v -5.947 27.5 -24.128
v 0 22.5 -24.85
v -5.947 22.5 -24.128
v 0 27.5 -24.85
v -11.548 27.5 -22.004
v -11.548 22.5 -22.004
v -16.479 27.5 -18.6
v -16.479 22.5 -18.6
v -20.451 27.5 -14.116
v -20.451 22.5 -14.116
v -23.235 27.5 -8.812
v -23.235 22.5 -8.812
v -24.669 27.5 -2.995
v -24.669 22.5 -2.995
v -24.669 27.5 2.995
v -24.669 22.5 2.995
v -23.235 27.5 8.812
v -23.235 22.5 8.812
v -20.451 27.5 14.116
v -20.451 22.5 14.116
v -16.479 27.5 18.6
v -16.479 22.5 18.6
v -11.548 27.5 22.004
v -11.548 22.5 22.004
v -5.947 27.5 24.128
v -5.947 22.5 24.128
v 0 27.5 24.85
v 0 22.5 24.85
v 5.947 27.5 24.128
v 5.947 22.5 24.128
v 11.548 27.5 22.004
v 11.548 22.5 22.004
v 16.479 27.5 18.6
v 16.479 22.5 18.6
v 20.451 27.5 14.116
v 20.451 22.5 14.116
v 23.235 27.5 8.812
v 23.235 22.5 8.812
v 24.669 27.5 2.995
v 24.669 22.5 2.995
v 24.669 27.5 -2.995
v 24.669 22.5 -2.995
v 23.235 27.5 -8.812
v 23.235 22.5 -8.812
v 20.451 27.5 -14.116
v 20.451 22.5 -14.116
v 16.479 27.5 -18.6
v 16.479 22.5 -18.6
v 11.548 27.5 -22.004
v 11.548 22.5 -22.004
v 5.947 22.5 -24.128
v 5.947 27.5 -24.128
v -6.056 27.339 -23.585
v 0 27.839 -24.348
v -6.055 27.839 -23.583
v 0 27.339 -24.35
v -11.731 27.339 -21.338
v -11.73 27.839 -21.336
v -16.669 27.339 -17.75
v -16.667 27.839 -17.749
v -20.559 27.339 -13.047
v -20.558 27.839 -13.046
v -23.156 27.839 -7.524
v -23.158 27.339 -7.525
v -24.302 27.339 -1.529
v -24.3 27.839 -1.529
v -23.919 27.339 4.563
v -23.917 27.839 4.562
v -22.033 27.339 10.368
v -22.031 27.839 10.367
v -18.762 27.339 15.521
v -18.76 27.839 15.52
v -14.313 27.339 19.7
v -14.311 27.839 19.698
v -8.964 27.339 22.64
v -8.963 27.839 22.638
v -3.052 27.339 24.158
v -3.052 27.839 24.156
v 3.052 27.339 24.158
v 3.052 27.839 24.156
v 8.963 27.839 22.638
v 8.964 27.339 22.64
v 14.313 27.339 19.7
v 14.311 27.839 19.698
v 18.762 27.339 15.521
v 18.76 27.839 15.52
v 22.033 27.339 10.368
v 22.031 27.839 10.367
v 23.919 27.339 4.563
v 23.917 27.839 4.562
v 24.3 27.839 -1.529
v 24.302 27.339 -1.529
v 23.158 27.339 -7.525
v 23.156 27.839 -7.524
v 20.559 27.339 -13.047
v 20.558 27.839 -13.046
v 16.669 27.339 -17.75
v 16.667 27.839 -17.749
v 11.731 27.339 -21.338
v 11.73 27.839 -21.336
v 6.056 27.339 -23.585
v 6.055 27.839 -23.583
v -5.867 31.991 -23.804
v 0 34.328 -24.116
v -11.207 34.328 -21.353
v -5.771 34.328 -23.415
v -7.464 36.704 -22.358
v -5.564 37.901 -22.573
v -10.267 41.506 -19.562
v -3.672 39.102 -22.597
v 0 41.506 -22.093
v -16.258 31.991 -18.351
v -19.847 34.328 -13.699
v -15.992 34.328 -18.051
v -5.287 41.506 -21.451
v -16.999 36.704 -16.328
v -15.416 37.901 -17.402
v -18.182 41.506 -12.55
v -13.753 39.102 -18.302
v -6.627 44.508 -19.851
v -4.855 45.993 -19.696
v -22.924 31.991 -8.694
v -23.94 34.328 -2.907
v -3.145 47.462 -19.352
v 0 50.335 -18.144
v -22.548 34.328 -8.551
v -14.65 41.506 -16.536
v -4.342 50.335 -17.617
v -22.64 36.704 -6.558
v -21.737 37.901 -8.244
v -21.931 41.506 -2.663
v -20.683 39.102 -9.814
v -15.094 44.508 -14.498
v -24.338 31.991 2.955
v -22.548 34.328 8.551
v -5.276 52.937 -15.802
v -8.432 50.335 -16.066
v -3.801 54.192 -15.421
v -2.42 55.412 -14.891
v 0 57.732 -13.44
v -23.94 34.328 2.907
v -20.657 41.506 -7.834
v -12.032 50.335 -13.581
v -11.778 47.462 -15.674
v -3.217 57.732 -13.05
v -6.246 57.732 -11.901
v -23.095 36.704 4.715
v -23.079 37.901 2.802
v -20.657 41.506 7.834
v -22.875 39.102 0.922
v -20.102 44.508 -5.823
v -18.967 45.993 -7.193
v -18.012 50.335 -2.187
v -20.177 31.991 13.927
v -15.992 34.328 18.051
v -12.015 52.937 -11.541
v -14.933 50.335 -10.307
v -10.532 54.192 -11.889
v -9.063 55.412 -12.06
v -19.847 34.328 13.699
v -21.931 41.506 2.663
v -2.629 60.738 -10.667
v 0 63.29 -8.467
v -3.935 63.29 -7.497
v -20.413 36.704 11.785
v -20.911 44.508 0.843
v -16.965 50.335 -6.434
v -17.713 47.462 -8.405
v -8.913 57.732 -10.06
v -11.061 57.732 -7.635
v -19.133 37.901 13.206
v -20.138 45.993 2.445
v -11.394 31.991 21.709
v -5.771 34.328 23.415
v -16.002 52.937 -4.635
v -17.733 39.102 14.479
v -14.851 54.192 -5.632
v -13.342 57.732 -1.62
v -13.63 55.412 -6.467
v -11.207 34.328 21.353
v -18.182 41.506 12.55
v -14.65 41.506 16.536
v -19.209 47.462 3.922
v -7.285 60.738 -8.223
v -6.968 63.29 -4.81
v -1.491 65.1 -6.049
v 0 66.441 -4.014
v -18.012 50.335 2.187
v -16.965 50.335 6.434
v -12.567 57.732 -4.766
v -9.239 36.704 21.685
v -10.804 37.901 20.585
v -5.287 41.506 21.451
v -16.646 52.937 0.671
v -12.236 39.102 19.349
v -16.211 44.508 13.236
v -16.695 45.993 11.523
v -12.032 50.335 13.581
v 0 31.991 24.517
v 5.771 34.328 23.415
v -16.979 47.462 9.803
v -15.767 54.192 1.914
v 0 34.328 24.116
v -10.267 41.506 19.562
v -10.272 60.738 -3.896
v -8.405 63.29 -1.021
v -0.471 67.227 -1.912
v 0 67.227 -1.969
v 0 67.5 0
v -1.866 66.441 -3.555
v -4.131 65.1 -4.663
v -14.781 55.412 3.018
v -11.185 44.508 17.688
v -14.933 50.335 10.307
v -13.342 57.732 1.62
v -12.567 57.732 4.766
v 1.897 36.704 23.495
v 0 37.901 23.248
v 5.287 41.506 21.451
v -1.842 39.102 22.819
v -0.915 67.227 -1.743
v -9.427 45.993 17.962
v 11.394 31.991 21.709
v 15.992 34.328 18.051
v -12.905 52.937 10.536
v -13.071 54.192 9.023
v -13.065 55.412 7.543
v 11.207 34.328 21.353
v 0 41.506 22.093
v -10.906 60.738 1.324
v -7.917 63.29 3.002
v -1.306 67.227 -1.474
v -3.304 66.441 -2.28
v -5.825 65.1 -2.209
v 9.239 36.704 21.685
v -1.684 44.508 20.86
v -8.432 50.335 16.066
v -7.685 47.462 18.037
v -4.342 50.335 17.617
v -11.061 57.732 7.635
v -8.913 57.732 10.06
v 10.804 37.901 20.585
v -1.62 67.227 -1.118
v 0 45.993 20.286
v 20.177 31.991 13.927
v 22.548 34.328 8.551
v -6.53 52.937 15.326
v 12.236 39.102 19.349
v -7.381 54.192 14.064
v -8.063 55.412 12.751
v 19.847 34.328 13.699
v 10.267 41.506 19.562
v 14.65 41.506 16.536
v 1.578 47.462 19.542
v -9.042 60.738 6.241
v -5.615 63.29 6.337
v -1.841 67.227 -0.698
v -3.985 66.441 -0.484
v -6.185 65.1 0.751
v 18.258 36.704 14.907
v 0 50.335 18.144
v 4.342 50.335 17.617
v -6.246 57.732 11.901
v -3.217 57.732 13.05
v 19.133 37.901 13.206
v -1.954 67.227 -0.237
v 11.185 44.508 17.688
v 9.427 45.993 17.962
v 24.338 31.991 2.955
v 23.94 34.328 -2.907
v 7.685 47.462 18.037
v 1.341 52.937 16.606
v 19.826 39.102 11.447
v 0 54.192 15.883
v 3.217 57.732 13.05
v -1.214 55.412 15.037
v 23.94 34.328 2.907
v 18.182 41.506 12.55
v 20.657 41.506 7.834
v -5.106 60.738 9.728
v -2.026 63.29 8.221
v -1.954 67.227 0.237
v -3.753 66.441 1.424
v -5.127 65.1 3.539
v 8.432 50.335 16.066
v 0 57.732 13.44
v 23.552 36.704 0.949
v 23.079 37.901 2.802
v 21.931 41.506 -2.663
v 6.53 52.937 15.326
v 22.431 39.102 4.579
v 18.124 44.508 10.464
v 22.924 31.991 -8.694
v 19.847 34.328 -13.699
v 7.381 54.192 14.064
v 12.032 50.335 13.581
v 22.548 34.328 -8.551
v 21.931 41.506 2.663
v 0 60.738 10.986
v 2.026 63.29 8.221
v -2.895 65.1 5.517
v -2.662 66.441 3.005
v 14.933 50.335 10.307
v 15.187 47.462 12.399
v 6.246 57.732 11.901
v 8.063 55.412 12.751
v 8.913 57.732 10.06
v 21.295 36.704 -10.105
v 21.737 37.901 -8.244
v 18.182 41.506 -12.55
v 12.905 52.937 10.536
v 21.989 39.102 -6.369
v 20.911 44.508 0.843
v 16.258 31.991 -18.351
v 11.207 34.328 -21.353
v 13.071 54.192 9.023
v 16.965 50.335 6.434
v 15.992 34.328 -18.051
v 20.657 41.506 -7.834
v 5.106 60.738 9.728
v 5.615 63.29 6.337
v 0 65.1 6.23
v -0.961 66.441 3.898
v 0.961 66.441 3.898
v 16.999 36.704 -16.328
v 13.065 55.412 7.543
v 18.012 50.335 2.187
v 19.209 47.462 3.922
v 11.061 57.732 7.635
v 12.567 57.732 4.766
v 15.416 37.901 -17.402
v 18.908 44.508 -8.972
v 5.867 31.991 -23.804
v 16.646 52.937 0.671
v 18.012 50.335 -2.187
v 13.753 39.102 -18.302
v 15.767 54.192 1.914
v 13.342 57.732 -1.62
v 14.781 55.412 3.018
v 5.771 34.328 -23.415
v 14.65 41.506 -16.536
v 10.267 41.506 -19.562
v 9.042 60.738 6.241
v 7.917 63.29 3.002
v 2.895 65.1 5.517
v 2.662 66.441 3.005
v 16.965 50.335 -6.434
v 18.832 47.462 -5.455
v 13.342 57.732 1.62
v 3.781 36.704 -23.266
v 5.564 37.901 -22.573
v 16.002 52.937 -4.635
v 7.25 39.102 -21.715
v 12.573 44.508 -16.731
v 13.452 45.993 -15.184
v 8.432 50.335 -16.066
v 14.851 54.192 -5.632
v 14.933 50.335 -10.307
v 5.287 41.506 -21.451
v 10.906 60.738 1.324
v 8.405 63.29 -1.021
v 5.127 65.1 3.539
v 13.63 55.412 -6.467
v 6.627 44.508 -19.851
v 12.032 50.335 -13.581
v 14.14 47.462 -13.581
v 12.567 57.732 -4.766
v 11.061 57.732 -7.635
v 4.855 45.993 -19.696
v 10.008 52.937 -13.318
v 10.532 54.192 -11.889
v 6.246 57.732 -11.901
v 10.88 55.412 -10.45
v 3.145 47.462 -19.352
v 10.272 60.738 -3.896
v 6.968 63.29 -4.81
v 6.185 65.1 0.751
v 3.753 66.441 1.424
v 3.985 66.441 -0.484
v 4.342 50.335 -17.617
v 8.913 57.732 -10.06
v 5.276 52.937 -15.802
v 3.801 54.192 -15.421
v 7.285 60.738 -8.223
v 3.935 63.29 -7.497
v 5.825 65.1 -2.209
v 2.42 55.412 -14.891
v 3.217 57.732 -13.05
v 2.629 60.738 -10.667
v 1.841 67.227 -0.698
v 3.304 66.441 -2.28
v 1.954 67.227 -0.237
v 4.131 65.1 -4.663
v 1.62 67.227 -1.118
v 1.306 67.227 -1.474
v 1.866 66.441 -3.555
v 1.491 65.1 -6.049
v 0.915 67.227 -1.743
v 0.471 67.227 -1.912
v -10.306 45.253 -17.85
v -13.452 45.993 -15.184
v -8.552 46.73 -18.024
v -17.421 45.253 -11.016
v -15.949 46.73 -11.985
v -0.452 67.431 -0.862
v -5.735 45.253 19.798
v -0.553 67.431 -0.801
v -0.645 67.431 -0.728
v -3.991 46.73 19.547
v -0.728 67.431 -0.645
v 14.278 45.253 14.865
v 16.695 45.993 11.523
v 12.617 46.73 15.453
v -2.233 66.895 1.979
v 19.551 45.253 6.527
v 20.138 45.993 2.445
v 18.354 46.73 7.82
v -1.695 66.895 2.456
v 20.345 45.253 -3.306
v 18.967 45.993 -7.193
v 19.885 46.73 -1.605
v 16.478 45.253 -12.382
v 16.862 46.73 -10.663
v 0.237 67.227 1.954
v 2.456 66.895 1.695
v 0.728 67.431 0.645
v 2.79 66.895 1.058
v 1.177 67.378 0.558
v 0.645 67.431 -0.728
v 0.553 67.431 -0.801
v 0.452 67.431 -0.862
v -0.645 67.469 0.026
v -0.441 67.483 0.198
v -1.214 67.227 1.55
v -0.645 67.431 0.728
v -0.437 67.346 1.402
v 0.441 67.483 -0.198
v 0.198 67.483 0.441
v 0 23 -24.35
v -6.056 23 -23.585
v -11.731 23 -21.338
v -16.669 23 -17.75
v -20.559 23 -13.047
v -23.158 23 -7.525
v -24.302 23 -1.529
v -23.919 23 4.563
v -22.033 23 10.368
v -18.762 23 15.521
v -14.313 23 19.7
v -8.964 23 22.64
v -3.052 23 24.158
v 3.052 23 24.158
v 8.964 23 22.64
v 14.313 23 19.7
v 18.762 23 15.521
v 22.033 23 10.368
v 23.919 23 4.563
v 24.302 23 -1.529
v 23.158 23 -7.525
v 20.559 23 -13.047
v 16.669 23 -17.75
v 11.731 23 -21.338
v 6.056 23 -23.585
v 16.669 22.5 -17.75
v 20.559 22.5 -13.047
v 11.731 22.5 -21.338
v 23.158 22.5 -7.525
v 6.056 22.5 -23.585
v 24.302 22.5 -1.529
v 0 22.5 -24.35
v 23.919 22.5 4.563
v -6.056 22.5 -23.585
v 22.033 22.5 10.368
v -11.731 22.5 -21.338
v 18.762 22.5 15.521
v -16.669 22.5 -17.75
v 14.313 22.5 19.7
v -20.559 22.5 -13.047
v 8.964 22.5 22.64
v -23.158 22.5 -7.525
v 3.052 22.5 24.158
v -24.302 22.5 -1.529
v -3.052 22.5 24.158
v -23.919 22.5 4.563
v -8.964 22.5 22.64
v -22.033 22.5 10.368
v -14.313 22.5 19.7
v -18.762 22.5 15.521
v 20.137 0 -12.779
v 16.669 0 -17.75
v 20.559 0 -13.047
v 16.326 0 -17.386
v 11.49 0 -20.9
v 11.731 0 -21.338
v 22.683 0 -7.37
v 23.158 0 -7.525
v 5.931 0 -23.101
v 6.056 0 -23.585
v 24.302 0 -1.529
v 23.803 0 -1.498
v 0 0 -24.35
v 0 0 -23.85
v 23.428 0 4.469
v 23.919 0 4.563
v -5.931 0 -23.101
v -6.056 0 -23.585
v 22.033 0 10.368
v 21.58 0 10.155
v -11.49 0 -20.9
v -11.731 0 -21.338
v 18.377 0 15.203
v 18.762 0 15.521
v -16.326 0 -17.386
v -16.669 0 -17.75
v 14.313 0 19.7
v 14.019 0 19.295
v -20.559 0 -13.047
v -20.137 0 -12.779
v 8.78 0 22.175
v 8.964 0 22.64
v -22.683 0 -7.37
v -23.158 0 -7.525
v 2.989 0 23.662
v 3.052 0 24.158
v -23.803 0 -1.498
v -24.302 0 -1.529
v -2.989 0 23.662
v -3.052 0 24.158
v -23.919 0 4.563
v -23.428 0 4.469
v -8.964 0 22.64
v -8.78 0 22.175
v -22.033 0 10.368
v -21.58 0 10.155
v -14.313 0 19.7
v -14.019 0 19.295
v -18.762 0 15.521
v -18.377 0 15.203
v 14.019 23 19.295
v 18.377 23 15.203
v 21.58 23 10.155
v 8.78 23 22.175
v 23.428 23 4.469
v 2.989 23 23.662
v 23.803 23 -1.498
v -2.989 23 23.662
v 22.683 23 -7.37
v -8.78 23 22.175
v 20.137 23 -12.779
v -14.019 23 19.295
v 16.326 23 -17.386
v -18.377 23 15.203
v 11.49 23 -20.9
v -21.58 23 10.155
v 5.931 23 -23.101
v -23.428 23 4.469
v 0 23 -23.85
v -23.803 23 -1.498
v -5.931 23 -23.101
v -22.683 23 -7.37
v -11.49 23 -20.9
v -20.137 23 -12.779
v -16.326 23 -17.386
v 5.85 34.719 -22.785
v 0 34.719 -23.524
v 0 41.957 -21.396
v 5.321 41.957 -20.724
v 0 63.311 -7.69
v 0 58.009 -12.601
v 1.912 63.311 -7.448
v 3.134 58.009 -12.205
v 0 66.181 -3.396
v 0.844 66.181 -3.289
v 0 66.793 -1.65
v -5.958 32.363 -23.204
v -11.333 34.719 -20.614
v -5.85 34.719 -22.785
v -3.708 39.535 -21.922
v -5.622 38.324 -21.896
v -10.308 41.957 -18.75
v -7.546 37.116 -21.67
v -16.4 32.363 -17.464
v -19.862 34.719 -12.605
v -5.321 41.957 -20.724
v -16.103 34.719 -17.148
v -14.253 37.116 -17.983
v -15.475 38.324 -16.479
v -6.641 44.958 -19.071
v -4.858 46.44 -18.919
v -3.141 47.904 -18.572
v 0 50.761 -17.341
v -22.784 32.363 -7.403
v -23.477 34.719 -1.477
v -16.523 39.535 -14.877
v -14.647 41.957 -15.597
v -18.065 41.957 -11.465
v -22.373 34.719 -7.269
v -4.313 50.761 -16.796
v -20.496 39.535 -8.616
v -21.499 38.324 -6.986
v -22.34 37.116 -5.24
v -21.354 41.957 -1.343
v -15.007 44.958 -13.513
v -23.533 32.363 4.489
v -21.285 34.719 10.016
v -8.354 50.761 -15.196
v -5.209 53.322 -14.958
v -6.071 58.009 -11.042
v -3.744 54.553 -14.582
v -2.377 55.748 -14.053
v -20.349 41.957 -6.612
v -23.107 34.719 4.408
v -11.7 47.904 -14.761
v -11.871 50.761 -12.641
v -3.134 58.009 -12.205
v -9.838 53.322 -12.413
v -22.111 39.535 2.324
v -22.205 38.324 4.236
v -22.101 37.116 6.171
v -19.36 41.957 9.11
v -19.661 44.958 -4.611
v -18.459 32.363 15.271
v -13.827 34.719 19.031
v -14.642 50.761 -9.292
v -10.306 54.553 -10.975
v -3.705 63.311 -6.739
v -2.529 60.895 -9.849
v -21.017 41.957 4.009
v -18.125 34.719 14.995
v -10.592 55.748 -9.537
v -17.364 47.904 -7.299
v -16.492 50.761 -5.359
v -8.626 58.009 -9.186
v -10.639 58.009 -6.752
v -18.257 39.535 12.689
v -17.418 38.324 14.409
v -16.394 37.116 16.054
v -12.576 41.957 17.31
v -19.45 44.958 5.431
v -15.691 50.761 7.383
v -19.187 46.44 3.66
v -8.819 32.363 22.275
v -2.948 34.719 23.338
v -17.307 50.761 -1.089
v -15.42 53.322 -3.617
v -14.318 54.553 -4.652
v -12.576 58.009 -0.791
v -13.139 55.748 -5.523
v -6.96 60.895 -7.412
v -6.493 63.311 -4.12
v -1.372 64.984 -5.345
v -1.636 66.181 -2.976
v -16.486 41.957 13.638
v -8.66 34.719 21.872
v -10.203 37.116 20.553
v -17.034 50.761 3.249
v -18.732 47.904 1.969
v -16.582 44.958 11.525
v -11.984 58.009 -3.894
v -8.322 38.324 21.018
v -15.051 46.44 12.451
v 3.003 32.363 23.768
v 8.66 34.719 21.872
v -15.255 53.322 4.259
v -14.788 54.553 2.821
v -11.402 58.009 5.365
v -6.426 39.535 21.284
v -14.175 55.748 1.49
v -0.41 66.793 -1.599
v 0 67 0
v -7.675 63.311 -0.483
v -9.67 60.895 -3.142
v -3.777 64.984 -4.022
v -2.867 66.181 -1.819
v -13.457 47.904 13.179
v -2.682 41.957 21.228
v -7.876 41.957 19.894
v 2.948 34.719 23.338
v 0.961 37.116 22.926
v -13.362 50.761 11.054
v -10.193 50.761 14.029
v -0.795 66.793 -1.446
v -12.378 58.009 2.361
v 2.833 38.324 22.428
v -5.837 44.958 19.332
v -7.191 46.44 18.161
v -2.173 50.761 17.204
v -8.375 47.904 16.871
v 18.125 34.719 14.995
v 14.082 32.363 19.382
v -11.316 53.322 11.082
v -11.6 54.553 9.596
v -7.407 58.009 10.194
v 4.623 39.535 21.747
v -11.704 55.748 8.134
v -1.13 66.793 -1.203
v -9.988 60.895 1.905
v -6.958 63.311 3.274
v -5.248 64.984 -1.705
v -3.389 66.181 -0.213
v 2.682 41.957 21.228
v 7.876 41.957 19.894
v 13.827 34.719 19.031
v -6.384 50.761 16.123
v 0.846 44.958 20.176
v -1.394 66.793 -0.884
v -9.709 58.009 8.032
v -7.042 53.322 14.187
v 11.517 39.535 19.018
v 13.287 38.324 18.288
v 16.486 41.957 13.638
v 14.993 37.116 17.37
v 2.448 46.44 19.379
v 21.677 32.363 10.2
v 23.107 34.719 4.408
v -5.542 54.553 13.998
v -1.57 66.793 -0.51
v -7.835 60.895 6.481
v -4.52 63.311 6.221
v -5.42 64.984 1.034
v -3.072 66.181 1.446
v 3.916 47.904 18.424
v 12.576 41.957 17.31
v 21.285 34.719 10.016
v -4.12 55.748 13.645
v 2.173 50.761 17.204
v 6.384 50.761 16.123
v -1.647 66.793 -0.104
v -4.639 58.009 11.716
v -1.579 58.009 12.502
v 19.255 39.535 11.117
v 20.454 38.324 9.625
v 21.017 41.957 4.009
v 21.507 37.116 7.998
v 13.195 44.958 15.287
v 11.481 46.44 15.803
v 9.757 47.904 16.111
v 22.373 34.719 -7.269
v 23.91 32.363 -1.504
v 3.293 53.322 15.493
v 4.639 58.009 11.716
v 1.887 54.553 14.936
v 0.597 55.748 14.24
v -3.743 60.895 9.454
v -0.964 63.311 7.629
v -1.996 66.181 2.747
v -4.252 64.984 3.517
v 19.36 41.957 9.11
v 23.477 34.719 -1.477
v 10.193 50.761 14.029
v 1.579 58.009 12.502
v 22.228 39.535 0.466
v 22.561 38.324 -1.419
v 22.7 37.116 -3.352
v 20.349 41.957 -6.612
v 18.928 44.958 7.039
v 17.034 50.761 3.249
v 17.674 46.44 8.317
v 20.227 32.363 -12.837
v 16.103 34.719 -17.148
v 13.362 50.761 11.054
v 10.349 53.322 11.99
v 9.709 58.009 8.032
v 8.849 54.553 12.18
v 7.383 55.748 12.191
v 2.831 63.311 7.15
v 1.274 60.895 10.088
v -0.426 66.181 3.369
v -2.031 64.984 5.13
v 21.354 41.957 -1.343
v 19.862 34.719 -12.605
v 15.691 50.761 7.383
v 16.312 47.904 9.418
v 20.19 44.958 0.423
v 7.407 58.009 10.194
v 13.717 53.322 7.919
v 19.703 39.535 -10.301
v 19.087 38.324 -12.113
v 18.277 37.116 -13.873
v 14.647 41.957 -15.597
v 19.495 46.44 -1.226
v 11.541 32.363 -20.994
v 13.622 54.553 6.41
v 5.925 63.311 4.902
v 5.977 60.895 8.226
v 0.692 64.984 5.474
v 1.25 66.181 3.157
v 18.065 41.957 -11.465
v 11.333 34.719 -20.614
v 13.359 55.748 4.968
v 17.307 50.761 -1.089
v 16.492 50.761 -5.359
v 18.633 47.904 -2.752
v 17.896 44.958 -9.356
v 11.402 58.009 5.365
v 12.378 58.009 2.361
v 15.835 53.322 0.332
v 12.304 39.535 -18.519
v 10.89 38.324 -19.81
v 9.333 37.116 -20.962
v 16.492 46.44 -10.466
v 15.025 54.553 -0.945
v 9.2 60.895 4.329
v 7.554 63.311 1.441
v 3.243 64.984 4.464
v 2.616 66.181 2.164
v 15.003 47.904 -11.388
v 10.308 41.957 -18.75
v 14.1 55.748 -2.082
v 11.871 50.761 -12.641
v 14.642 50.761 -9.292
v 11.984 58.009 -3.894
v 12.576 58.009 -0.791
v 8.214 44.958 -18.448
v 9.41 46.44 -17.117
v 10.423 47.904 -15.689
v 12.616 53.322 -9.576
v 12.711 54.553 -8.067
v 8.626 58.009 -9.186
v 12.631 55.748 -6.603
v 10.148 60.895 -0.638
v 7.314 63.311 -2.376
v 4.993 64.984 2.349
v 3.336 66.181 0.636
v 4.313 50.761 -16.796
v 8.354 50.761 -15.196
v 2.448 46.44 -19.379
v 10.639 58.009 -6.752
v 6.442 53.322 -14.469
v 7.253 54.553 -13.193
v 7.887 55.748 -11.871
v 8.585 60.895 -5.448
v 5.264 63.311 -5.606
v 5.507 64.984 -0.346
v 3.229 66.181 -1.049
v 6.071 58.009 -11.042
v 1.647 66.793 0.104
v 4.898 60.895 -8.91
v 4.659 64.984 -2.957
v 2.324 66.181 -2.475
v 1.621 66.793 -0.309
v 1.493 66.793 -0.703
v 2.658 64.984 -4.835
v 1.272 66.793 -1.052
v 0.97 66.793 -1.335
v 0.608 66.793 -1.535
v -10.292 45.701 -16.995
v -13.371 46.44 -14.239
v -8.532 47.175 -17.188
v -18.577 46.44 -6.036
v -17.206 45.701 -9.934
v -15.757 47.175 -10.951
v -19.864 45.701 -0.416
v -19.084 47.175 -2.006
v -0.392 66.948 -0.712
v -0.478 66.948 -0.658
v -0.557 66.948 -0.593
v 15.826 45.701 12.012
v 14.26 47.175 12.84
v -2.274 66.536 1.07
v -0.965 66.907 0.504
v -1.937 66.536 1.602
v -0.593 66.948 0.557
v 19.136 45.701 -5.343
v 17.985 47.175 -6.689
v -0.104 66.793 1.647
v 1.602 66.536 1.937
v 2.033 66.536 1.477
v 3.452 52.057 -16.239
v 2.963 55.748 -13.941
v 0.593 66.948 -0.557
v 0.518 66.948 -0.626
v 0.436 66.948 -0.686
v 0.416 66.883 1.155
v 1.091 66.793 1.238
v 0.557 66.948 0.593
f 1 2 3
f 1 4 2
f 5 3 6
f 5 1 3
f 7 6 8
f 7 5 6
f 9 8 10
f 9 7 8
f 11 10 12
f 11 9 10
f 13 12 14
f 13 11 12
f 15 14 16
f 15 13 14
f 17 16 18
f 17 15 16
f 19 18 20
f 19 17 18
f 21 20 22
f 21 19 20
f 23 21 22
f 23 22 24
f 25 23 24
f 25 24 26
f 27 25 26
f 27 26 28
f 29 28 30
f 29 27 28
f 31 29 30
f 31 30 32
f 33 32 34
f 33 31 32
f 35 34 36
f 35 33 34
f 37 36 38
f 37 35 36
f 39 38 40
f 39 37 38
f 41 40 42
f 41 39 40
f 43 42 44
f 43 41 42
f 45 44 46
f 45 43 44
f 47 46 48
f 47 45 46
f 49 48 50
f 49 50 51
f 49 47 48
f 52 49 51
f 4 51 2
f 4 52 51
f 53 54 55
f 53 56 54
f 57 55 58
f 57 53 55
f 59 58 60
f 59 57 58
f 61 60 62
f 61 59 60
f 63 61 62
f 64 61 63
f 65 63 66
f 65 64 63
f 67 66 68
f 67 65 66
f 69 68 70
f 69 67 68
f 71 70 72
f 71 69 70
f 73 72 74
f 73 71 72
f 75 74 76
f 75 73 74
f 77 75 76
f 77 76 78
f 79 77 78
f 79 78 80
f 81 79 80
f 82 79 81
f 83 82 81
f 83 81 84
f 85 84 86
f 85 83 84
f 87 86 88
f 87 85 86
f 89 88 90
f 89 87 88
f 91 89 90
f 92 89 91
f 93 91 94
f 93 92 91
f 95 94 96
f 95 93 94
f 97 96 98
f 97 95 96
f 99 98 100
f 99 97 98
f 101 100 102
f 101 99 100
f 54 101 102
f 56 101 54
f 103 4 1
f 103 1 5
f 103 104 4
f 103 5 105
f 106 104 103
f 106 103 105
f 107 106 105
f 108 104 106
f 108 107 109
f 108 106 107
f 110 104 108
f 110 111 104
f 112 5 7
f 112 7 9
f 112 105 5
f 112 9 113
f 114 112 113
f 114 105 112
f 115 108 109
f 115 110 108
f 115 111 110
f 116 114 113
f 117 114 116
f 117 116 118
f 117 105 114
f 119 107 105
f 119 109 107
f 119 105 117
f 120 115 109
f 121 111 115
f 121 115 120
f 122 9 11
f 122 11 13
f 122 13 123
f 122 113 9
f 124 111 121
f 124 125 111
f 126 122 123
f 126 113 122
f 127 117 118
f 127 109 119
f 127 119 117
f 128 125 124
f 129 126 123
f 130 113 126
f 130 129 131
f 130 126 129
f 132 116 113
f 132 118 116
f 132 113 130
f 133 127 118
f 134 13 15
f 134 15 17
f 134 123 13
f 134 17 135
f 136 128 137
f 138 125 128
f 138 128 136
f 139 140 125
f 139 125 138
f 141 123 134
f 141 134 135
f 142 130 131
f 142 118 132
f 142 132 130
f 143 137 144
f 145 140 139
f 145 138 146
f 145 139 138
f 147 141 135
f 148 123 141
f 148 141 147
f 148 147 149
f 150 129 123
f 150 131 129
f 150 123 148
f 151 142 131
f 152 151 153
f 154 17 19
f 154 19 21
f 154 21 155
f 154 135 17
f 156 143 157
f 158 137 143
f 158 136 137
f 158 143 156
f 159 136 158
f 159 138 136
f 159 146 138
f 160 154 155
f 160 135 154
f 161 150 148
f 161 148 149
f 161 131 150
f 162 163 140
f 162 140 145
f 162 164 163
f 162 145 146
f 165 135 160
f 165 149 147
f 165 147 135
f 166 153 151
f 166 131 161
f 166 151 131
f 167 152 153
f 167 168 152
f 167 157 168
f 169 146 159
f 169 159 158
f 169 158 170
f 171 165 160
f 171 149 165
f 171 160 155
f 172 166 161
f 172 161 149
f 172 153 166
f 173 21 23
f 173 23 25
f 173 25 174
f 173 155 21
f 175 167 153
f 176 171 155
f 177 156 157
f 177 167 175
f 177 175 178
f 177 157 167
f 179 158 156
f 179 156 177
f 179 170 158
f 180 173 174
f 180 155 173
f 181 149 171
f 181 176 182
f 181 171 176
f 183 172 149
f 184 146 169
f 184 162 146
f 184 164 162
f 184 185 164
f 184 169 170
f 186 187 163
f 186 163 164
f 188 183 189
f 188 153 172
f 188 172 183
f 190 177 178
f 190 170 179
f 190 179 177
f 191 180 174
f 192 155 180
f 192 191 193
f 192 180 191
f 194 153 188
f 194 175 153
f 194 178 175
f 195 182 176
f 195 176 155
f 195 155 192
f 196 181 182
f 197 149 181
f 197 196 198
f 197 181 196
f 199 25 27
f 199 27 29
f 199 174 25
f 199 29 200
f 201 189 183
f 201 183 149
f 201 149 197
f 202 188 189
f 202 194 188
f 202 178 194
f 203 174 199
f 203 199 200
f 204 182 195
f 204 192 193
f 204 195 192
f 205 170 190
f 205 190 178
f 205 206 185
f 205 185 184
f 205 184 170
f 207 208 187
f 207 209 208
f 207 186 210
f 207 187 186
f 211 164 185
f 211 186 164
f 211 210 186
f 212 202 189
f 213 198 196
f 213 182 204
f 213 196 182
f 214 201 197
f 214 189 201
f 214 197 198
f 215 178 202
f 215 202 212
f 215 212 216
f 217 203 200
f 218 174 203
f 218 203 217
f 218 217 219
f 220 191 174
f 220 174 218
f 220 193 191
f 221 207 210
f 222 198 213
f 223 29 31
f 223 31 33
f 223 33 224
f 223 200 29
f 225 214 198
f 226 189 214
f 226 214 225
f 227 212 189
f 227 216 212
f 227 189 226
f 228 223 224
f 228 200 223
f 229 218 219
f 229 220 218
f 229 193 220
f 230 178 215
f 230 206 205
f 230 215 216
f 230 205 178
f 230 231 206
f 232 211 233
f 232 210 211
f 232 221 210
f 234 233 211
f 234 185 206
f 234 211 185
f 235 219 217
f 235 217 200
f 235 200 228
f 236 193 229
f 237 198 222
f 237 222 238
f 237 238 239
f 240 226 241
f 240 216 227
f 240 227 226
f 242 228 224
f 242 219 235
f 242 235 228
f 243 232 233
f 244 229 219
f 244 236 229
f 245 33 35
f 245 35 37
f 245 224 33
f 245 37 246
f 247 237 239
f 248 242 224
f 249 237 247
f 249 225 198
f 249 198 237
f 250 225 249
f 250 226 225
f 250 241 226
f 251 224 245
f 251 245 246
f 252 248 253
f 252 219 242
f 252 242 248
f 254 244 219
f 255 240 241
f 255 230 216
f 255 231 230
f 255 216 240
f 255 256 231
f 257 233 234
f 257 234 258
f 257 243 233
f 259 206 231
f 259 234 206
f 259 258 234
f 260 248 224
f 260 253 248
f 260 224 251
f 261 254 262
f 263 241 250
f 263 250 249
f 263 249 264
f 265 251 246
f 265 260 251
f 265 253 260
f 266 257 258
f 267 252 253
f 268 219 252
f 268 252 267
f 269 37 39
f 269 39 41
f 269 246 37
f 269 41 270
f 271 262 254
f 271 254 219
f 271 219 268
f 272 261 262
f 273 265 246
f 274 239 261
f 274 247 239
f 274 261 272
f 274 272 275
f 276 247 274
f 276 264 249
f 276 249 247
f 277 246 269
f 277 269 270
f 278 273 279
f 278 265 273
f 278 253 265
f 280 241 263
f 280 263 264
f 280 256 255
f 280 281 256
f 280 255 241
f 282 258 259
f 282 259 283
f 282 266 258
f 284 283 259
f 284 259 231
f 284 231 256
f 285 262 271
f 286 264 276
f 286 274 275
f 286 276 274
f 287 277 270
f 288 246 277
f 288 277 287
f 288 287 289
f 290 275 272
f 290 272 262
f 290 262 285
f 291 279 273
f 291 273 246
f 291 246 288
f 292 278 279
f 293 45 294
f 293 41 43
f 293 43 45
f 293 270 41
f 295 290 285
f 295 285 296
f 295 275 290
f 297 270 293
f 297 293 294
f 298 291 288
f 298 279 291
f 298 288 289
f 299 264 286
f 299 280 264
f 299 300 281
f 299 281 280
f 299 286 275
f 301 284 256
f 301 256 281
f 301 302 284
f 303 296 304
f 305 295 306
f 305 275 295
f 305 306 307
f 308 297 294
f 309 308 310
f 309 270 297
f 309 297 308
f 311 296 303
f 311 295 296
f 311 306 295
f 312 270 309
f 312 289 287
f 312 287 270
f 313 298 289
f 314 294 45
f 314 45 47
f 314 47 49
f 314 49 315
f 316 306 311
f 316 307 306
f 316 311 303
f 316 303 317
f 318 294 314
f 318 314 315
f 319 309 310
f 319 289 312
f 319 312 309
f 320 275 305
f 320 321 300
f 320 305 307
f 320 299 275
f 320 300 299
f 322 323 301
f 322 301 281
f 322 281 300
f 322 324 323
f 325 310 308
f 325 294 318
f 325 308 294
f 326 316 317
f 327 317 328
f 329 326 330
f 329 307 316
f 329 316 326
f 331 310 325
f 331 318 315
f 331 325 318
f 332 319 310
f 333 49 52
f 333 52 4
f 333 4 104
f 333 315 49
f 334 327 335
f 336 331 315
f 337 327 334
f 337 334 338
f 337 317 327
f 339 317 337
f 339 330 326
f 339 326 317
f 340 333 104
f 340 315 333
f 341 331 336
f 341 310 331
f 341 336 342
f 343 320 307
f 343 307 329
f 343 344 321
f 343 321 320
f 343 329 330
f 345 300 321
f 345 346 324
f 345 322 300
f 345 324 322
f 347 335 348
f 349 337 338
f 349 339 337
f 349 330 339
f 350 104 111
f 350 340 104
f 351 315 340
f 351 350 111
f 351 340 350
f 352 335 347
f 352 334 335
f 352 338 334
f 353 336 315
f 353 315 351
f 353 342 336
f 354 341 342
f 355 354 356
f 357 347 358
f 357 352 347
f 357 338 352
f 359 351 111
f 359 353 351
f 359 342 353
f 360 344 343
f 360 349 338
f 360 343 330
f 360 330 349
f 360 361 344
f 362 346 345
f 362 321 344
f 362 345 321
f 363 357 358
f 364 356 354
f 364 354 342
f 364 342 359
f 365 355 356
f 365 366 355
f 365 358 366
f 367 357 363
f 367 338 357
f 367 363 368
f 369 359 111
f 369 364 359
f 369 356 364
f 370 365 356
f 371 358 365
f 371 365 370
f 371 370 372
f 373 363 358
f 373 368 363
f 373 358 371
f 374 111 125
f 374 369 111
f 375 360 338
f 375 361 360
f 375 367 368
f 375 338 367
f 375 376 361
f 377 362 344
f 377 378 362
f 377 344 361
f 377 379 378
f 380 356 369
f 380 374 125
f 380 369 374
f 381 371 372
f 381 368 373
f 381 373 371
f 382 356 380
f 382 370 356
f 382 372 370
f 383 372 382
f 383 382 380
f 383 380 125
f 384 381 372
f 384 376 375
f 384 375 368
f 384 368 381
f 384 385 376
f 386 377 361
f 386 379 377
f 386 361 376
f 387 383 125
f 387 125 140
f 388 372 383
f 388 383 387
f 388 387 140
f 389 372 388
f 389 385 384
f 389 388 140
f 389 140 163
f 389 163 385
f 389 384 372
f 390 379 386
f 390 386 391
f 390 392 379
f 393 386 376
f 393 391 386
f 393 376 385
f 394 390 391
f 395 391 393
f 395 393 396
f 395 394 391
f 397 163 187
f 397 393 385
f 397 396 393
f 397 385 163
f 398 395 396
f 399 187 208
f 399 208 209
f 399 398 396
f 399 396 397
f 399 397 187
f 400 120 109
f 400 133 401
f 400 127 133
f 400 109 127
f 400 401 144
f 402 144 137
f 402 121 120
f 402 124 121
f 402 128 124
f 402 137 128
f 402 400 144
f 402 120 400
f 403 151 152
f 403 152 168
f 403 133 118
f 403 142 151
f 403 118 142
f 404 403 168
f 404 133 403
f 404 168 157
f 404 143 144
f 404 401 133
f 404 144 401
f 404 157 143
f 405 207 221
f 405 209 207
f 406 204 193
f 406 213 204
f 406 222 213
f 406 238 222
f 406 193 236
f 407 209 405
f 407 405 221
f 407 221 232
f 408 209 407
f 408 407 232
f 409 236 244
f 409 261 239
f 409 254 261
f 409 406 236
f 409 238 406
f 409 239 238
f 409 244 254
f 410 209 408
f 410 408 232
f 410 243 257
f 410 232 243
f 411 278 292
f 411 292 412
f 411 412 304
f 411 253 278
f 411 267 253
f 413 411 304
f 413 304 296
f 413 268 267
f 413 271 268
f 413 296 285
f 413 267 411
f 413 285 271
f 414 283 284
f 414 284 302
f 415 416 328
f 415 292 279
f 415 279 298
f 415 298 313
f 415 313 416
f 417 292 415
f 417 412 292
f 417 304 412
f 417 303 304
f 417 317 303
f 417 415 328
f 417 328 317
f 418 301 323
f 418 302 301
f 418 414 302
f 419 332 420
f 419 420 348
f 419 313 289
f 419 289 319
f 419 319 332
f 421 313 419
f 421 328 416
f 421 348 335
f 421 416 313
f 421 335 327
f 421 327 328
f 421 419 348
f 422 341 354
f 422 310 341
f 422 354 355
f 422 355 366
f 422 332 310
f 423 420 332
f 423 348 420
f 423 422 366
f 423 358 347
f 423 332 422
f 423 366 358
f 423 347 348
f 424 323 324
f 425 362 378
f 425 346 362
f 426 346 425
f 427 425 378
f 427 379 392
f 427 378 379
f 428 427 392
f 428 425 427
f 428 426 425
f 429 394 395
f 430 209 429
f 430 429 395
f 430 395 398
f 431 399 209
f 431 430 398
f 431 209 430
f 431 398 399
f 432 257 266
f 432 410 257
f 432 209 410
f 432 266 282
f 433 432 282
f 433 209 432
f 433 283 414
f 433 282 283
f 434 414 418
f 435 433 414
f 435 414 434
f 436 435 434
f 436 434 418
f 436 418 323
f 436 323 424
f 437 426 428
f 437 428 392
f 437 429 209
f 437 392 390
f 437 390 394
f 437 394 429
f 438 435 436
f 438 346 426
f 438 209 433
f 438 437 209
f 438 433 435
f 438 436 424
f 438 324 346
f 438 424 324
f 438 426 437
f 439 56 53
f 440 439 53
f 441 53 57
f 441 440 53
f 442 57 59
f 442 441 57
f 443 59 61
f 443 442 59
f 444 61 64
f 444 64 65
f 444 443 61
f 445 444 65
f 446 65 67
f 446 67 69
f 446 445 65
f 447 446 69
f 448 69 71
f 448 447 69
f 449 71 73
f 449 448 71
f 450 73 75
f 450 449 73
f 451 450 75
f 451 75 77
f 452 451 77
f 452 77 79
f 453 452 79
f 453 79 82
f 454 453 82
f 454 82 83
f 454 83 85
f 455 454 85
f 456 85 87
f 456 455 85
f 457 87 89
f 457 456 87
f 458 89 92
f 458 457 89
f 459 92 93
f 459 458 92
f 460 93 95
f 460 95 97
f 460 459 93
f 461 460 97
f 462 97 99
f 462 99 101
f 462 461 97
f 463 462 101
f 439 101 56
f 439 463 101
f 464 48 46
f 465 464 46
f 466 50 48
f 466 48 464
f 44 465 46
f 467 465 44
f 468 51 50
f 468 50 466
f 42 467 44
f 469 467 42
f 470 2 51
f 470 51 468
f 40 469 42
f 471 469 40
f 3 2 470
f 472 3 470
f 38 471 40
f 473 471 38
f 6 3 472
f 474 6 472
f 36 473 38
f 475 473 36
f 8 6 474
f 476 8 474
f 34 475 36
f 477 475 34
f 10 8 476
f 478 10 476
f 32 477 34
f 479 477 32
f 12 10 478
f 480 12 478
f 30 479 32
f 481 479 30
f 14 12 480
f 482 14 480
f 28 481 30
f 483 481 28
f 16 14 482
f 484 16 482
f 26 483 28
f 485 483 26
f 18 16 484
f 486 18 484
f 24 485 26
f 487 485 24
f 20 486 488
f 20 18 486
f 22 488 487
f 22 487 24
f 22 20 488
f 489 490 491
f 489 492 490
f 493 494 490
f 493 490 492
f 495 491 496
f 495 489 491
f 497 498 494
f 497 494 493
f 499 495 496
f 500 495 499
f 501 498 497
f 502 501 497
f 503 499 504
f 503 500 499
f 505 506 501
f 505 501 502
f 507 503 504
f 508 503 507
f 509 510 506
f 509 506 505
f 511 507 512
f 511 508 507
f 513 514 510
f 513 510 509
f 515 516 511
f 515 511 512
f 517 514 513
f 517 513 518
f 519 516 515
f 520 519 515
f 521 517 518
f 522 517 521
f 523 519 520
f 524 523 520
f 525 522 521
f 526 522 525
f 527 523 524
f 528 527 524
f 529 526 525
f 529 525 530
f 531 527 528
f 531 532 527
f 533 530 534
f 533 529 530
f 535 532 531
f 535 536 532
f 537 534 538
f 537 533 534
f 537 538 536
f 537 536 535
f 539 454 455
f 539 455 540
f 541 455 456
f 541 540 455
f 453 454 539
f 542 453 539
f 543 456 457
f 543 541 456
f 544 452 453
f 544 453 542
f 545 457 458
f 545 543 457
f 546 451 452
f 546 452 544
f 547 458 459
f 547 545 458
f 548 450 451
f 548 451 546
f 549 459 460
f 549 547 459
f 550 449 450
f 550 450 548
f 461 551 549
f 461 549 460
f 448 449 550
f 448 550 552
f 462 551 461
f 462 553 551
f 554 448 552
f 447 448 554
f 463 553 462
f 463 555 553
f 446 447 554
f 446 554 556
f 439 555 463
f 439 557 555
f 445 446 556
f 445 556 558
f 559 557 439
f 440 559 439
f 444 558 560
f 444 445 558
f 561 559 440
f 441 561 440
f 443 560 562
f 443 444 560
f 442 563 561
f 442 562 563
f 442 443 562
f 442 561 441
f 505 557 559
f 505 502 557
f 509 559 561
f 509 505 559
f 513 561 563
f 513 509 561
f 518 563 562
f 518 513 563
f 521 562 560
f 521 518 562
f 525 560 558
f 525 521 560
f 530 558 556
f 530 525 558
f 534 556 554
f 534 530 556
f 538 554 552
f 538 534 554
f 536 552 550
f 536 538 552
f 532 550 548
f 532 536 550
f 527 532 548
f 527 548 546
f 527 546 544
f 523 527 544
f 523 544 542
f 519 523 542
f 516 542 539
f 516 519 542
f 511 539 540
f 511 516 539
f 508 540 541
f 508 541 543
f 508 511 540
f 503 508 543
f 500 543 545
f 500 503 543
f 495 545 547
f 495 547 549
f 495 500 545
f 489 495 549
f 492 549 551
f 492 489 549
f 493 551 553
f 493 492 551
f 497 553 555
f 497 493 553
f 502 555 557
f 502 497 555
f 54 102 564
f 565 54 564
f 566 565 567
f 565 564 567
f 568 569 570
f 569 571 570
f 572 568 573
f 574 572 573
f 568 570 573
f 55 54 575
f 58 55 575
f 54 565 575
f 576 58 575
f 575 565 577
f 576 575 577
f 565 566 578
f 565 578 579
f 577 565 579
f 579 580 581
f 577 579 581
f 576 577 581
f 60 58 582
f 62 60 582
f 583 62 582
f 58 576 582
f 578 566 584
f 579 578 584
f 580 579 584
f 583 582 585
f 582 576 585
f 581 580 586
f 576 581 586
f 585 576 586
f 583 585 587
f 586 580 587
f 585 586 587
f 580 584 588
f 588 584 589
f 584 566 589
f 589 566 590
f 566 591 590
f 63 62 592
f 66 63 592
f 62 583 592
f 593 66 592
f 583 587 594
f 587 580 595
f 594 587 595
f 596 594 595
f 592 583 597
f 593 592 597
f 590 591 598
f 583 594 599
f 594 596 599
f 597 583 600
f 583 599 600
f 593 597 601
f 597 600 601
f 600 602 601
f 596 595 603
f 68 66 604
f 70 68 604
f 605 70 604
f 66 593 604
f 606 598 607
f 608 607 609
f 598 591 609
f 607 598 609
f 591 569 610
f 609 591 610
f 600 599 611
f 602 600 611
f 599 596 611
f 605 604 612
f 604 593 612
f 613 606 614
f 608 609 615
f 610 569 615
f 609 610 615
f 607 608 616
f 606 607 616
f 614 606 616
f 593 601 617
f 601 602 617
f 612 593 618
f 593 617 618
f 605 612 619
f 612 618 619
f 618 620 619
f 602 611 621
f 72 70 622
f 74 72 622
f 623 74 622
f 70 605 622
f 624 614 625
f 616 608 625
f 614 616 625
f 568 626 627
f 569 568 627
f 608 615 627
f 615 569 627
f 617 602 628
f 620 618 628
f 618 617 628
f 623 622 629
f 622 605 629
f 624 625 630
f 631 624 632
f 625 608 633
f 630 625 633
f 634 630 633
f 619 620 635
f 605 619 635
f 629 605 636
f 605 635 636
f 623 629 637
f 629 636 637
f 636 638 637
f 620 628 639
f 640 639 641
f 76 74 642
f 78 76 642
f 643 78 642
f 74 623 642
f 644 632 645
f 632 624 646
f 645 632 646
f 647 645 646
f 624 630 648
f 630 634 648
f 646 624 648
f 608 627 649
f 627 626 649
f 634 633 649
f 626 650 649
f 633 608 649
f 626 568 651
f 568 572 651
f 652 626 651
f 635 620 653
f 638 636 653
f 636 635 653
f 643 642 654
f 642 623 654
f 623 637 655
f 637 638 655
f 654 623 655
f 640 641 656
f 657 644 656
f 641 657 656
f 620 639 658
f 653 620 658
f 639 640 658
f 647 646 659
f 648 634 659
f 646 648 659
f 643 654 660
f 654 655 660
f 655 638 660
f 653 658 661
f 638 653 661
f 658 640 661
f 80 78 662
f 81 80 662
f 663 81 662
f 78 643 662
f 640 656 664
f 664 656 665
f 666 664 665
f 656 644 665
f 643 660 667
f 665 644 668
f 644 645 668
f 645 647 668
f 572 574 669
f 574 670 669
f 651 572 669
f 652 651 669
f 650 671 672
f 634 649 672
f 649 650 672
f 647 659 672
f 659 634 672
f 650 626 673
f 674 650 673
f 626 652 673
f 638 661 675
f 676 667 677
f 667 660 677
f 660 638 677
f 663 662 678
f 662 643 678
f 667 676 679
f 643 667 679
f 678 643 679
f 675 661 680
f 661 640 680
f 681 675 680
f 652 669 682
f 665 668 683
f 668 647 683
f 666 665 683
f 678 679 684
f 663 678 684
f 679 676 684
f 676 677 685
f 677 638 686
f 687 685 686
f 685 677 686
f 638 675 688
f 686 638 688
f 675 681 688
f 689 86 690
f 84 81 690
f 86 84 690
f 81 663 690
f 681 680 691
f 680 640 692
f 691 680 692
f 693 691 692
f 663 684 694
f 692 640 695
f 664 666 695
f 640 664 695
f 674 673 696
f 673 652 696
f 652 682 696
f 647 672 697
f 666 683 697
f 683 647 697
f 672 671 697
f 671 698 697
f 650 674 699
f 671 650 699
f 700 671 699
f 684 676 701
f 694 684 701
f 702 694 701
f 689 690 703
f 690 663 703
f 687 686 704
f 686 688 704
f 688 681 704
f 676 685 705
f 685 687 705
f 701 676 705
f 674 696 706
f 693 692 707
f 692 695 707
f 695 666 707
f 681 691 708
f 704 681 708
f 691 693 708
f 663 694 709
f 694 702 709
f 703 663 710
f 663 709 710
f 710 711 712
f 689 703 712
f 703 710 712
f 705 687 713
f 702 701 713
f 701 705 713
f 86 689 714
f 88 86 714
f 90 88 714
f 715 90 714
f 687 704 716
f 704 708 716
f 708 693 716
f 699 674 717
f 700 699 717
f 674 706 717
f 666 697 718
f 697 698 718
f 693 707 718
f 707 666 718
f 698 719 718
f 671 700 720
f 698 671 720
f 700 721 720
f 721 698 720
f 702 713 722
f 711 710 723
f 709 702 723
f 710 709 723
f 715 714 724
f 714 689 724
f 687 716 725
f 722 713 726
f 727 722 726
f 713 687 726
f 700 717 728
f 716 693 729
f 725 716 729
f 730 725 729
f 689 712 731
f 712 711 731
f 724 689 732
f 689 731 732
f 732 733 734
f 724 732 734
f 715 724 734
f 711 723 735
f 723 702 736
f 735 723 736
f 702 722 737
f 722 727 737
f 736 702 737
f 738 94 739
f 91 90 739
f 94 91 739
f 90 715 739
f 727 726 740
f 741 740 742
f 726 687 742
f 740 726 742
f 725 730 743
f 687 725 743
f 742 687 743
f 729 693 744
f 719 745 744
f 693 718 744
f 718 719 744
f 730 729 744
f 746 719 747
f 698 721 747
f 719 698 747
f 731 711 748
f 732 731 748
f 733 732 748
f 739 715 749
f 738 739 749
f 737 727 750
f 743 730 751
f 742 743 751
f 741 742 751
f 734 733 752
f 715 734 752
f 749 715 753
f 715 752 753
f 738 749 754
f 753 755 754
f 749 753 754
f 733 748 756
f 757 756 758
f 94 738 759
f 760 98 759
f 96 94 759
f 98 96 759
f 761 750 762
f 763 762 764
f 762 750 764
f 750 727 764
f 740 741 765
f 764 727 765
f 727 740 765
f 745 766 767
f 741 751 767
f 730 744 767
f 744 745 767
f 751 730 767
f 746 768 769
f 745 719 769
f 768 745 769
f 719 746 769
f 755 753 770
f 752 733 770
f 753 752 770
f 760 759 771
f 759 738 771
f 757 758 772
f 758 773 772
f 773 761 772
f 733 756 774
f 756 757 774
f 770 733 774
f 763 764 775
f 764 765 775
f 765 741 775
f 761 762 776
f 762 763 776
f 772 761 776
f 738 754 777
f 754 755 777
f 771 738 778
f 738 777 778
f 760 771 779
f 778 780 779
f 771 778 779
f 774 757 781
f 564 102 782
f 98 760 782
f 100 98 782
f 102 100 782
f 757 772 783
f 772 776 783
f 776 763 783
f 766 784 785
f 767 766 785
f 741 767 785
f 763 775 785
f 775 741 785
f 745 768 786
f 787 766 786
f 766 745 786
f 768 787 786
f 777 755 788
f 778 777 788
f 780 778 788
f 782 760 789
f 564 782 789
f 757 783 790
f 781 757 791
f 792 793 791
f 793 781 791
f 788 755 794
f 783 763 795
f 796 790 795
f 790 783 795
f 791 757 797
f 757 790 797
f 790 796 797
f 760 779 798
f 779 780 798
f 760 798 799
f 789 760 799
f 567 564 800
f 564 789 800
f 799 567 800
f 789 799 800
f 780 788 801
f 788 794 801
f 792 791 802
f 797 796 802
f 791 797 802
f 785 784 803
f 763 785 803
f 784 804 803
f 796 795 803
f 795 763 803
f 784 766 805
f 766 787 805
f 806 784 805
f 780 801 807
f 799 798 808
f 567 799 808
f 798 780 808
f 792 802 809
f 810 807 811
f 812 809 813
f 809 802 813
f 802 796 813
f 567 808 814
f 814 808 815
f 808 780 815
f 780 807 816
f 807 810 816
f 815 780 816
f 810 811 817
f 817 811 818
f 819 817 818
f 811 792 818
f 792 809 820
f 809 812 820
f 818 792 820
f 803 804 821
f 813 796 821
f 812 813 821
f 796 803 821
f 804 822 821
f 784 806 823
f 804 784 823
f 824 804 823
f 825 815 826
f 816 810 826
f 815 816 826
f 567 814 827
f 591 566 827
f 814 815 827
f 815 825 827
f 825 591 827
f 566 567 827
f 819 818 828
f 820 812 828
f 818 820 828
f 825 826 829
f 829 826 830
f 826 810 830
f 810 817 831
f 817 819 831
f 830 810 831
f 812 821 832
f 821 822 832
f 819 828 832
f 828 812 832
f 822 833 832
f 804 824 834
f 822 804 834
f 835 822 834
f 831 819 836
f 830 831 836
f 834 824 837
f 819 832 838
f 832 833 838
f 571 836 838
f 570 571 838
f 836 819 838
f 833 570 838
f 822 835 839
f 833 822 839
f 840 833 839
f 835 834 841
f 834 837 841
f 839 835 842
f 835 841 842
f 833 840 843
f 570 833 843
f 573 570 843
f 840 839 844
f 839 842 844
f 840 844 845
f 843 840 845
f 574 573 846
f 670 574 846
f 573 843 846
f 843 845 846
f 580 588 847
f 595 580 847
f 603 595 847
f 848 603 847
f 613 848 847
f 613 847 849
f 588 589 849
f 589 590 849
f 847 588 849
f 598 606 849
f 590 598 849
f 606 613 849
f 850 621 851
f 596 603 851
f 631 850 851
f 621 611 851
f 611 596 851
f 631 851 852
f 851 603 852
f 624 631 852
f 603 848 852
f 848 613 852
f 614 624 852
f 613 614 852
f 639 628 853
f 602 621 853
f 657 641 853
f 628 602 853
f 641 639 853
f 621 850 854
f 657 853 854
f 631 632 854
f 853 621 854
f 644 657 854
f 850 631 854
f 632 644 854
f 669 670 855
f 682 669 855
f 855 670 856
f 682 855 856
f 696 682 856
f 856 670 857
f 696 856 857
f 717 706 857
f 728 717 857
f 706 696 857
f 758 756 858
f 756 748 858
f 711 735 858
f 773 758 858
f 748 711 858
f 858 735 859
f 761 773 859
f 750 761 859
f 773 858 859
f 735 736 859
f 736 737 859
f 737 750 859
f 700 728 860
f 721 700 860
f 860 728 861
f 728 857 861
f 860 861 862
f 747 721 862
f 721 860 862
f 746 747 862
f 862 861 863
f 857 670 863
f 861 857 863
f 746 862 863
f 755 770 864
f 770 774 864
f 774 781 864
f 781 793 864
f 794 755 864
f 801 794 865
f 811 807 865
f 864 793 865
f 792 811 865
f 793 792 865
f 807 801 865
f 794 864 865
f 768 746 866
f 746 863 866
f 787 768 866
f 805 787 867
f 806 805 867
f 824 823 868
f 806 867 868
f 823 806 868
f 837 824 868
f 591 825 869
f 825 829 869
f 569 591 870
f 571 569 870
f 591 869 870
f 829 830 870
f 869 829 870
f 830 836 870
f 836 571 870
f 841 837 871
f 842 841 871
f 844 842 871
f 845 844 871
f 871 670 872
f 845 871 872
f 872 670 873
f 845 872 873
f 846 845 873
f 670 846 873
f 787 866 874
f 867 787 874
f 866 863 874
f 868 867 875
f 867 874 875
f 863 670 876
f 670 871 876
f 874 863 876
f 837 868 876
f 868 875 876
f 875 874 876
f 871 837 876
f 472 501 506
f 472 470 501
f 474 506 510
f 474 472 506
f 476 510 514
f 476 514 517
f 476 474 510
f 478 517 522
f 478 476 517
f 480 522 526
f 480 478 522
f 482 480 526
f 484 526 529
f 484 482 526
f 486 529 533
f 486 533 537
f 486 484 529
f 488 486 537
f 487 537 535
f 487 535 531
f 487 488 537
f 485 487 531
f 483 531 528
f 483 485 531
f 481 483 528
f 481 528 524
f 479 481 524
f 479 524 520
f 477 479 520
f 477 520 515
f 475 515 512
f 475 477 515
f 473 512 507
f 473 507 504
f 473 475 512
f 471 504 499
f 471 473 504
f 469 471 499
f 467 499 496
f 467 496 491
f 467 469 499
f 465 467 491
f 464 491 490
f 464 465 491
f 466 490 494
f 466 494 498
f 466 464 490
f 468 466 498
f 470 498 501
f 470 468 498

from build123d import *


with BuildPart() as part:
    # Sketch1 → Revolve1 (revolve)
    with BuildSketch(Plane.XY, mode=Mode.PRIVATE) as revolve1_sk:
        with BuildLine():
            Line((-24.35, 0), (-24.35, 22.5))
            Line((-24.35, 22.5), (-24.85, 22.5))
            Line((-24.85, 22.5), (-24.85, 27.5))
            add(Edge.make_bspline(
                [(-24.85, 27.5), (-24.85, 43.780206444), (-10.204077545, 67.5), (0, 67.5)],
                knots=[0, 0, 0, 0, 1, 1, 1, 1], degree=3))
            Line((0, 67.5), (0, 67))
            add(Edge.make_bspline(
                [(-24.347860096, 27.839321298), (-24.341499711, 28.346010553), (-24.301638833, 29.348577965), (-24.11580728, 31.431845462), (-23.693138479, 34.108229535), (-22.907065114, 37.40744686), (-21.522873709, 41.854689286), (-19.230151883, 47.392139738), (-15.79882975, 53.635971479), (-11.911009312, 59.115064281), (-8.481216154, 62.739755317), (-5.747015733, 64.892995549), (-3.734640767, 66.090760209), (-2.124093421, 66.707799141), (-0.885893826, 66.957799804), (-0.298692976, 67), (0, 67)],
                knots=[0.007053509, 0.007053509, 0.007053509, 0.007053509, 0.038083087, 0.069112665, 0.13117182, 0.193230976, 0.255290132, 0.379408443, 0.503526755, 0.627645066, 0.751763377, 0.813822533, 0.875881689, 0.937940844, 0.968970422, 1, 1, 1, 1], degree=3))
            Line((-24.347860096, 27.839321298), (-24.35, 27.339325877))
            Line((-24.35, 27.339325877), (-24.35, 23))
            Line((-24.35, 23), (-23.85, 23))
            Line((-23.85, 23), (-23.85, 0))
            Line((-23.85, 0), (-24.35, 0))
        make_face()
    revolve(revolve1_sk.sketch.rotate(Axis((0, 0, 0), (0, 1, 0)), 270), axis=Axis((0, 0, 0), (0, 1, 0)))


solid = part.part
